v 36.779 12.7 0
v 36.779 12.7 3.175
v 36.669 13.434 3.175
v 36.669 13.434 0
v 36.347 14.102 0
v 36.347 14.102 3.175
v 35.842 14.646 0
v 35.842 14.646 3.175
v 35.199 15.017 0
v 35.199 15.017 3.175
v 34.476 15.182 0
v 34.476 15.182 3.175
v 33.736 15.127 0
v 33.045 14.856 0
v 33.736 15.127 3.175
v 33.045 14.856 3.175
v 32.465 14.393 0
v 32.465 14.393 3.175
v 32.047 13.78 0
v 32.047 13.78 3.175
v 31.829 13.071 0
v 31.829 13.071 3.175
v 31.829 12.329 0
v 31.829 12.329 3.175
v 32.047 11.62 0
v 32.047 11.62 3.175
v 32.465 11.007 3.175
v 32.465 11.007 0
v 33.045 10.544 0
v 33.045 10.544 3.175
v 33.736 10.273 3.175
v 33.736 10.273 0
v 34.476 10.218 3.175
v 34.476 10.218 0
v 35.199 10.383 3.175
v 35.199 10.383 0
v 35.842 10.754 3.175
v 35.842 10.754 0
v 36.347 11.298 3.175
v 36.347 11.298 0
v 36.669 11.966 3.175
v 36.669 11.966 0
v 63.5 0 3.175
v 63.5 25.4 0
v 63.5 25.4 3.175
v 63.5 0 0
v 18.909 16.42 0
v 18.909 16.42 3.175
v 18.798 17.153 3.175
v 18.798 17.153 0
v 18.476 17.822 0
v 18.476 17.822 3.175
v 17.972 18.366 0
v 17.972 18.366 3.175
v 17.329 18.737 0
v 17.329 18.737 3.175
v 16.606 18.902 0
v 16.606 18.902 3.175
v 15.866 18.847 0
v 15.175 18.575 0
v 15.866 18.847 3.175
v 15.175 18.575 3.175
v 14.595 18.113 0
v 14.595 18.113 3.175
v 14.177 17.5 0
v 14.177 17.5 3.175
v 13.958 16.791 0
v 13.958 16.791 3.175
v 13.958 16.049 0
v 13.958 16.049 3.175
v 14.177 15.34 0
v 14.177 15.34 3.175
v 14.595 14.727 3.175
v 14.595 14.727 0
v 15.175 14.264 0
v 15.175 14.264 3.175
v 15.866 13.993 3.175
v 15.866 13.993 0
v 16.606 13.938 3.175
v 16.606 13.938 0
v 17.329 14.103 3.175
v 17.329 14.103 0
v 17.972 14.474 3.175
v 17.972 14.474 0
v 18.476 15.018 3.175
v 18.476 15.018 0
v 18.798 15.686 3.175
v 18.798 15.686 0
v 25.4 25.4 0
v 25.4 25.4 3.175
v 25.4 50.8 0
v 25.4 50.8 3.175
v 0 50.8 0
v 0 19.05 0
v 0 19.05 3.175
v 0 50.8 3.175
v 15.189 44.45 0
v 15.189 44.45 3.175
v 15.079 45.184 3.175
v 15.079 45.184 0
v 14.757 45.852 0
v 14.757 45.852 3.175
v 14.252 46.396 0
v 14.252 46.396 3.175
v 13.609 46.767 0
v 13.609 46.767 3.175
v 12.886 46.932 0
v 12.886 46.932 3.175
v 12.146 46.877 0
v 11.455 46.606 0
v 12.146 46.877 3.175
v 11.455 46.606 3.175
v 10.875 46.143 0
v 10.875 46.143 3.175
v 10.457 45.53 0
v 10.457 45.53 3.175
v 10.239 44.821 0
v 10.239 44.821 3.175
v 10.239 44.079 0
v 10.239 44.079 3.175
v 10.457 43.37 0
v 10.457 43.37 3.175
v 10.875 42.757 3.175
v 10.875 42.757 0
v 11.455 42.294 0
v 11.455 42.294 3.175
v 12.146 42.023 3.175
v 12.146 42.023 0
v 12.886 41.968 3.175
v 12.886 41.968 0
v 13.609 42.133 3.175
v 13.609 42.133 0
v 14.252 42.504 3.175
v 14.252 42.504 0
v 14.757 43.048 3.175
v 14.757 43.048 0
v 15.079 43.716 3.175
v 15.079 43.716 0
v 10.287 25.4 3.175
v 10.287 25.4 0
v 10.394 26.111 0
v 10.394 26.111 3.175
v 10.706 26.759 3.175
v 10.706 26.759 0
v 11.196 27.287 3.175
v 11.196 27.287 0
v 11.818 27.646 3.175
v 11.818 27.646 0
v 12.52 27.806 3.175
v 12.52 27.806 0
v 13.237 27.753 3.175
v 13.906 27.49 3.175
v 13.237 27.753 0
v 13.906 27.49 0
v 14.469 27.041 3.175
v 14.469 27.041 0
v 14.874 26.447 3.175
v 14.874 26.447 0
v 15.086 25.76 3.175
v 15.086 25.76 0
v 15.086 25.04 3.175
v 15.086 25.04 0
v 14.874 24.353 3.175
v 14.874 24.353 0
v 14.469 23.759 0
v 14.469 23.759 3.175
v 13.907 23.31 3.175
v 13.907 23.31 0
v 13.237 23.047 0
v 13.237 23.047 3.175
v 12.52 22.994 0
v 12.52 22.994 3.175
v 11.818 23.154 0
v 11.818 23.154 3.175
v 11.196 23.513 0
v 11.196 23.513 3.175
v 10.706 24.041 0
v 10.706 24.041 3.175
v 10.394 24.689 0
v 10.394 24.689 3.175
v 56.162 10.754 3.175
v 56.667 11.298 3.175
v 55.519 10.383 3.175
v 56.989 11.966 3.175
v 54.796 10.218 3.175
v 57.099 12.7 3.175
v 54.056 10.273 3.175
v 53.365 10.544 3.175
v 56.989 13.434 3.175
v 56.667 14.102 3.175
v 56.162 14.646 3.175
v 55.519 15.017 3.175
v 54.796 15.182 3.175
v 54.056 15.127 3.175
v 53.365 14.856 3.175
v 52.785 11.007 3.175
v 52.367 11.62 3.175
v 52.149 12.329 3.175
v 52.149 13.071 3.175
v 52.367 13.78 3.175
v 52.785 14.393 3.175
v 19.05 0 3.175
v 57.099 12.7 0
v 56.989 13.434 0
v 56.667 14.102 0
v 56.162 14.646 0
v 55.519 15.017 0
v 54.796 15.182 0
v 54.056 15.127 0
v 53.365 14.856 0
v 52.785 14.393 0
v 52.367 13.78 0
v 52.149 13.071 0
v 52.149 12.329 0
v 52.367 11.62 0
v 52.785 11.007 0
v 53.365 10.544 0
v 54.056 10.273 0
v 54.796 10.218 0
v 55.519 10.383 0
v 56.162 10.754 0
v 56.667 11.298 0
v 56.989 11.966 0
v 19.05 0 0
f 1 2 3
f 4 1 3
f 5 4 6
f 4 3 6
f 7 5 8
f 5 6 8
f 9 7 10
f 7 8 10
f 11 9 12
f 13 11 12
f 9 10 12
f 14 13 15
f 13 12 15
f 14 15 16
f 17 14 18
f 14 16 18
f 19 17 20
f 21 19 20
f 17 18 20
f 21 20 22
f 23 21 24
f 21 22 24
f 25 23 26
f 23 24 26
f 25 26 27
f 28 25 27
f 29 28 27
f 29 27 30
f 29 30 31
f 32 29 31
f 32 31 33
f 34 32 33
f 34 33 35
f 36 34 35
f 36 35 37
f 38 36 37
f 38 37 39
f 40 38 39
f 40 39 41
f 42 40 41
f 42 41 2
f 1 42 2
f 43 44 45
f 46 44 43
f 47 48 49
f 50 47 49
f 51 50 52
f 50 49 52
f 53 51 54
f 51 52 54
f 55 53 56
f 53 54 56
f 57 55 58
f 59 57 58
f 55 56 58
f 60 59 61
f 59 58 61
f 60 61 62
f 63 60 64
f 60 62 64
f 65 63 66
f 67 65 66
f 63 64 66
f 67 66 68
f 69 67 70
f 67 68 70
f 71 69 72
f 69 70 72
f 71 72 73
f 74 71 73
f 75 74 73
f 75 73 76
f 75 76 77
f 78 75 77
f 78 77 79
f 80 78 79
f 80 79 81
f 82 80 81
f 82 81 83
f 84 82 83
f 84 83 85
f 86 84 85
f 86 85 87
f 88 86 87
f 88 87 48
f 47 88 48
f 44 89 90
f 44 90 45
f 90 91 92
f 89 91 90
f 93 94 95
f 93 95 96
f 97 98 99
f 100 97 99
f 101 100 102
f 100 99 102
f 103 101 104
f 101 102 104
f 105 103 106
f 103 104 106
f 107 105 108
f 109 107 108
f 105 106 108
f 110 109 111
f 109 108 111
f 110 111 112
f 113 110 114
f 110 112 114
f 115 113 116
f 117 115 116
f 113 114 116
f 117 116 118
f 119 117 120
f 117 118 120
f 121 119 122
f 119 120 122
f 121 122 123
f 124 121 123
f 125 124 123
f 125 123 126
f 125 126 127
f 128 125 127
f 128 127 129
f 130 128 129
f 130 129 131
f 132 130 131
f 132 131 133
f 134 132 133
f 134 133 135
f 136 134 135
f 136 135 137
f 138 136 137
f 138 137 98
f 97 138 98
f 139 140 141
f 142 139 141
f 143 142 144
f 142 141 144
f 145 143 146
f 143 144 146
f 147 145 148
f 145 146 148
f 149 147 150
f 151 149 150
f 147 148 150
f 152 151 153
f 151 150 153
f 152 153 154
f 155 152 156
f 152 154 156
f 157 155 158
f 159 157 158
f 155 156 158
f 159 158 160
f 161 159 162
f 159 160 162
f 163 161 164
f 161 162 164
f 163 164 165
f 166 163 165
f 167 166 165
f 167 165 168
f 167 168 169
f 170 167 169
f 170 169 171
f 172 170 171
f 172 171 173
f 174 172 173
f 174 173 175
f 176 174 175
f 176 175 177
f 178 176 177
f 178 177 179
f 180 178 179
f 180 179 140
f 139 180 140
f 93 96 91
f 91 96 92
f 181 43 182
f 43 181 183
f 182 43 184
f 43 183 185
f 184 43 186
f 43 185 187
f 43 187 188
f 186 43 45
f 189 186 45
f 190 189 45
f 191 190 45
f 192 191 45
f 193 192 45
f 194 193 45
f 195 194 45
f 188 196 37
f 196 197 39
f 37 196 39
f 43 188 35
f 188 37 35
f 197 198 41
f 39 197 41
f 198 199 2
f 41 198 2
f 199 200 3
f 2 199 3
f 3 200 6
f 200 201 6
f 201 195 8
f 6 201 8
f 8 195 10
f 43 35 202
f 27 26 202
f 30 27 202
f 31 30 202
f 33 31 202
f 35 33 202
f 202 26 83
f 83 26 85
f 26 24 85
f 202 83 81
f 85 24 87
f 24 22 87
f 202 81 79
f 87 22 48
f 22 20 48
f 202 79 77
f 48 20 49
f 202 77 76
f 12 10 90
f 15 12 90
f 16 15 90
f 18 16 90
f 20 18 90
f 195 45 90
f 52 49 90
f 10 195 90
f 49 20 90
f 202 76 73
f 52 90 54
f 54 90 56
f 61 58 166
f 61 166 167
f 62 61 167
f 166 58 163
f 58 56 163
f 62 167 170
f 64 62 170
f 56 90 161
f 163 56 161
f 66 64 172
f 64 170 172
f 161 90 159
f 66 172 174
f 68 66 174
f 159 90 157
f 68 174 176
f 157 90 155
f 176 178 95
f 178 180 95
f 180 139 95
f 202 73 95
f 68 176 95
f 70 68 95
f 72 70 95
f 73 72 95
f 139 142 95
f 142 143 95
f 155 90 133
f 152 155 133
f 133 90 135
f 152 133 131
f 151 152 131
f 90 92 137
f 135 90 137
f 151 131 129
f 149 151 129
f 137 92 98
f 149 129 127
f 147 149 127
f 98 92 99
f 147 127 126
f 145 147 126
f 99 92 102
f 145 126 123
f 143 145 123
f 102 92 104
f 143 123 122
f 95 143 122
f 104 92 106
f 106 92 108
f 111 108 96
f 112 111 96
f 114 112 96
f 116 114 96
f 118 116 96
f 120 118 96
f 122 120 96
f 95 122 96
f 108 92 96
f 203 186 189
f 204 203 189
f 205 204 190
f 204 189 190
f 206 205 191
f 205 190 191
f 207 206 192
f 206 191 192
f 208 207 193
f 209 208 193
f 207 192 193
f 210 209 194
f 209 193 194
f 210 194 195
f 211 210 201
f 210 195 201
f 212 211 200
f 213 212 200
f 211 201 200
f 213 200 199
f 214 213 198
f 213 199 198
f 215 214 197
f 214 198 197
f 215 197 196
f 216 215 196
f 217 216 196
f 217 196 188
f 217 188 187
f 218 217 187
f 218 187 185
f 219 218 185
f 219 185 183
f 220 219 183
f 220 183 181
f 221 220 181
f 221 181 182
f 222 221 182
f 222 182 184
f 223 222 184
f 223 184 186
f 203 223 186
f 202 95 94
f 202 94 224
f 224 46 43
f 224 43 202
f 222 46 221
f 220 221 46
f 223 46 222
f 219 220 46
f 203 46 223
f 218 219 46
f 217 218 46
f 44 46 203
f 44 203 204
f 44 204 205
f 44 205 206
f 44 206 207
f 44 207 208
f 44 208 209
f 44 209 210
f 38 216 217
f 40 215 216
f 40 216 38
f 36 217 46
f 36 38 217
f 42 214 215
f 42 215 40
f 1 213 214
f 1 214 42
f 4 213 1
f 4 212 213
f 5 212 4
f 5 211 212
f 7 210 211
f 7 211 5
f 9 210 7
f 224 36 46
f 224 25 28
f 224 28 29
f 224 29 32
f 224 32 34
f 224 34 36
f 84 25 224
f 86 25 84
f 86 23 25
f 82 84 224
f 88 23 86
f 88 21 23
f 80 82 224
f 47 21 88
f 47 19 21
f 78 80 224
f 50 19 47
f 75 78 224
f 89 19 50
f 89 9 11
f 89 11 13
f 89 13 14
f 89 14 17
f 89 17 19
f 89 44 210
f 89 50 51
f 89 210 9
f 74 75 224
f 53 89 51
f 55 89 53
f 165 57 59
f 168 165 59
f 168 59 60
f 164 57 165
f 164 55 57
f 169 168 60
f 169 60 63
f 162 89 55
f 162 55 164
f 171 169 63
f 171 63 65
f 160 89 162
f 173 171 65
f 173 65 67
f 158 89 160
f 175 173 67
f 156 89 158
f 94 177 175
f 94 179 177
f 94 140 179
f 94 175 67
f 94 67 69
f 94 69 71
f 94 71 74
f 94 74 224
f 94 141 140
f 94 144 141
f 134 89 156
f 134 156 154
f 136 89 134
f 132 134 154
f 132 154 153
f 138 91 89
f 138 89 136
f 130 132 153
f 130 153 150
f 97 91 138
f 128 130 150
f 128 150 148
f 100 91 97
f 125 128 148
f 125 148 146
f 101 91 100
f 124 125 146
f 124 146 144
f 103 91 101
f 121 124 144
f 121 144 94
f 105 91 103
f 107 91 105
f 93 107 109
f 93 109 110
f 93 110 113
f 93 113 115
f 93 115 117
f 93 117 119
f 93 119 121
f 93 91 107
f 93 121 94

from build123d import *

# Parameters (mm, degrees)
BOSS_EXTRUDE1_DEPTH = 3.175
SKETCH3_R           = 2.4892
CUT_EXTRUDE1_DEPTH  = 4.175
SKETCH4_R           = 2.413
CUT_EXTRUDE2_DEPTH  = 4.175
SKETCH5_W           = 25.4
SKETCH5_H           = 12.7
CUT_EXTRUDE3_DEPTH  = 4.175


with BuildPart() as part:
    # Sketch2 → Boss-Extrude1 (new body)
    with BuildSketch(Plane.XY):
        Polygon((0, 0), (0, 63.5), (25.4, 63.5), (25.4, 25.4), (63.5, 25.4), (63.5, 0), align=None)
    extrude(amount=BOSS_EXTRUDE1_DEPTH)

    # Sketch3 → Cut-Extrude1 (cut, through all)
    with BuildSketch(Plane.XY.offset(3.175)):
        with Locations((16.419743879, 16.419743879)):
            Circle(SKETCH3_R)
        with Locations((12.7, 54.61)):
            Circle(SKETCH3_R)
        with Locations((12.7, 44.45)):
            Circle(SKETCH3_R)
        with Locations((34.29, 12.7)):
            Circle(SKETCH3_R)
        with Locations((54.61, 12.7)):
            Circle(SKETCH3_R)
        Polygon((0, 0), (0, 19.05), (19.05, 0), align=None)
    extrude(amount=-CUT_EXTRUDE1_DEPTH, mode=Mode.SUBTRACT)

    # Sketch4 → Cut-Extrude2 (cut, through all)
    with BuildSketch(Plane(origin=(0, 0, 0), x_dir=(-1, 0, 0), z_dir=(0, 0, -1))):
        with Locations((-12.7, 25.4)):
            Circle(SKETCH4_R)
    extrude(amount=-CUT_EXTRUDE2_DEPTH, mode=Mode.SUBTRACT)

    # Sketch5 → Cut-Extrude3 (cut, through all)
    with BuildSketch(Plane.XY.offset(3.175)):
        with Locations((12.7, 57.15)):
            Rectangle(SKETCH5_W, SKETCH5_H)
    extrude(amount=-CUT_EXTRUDE3_DEPTH, mode=Mode.SUBTRACT)


solid = part.part
